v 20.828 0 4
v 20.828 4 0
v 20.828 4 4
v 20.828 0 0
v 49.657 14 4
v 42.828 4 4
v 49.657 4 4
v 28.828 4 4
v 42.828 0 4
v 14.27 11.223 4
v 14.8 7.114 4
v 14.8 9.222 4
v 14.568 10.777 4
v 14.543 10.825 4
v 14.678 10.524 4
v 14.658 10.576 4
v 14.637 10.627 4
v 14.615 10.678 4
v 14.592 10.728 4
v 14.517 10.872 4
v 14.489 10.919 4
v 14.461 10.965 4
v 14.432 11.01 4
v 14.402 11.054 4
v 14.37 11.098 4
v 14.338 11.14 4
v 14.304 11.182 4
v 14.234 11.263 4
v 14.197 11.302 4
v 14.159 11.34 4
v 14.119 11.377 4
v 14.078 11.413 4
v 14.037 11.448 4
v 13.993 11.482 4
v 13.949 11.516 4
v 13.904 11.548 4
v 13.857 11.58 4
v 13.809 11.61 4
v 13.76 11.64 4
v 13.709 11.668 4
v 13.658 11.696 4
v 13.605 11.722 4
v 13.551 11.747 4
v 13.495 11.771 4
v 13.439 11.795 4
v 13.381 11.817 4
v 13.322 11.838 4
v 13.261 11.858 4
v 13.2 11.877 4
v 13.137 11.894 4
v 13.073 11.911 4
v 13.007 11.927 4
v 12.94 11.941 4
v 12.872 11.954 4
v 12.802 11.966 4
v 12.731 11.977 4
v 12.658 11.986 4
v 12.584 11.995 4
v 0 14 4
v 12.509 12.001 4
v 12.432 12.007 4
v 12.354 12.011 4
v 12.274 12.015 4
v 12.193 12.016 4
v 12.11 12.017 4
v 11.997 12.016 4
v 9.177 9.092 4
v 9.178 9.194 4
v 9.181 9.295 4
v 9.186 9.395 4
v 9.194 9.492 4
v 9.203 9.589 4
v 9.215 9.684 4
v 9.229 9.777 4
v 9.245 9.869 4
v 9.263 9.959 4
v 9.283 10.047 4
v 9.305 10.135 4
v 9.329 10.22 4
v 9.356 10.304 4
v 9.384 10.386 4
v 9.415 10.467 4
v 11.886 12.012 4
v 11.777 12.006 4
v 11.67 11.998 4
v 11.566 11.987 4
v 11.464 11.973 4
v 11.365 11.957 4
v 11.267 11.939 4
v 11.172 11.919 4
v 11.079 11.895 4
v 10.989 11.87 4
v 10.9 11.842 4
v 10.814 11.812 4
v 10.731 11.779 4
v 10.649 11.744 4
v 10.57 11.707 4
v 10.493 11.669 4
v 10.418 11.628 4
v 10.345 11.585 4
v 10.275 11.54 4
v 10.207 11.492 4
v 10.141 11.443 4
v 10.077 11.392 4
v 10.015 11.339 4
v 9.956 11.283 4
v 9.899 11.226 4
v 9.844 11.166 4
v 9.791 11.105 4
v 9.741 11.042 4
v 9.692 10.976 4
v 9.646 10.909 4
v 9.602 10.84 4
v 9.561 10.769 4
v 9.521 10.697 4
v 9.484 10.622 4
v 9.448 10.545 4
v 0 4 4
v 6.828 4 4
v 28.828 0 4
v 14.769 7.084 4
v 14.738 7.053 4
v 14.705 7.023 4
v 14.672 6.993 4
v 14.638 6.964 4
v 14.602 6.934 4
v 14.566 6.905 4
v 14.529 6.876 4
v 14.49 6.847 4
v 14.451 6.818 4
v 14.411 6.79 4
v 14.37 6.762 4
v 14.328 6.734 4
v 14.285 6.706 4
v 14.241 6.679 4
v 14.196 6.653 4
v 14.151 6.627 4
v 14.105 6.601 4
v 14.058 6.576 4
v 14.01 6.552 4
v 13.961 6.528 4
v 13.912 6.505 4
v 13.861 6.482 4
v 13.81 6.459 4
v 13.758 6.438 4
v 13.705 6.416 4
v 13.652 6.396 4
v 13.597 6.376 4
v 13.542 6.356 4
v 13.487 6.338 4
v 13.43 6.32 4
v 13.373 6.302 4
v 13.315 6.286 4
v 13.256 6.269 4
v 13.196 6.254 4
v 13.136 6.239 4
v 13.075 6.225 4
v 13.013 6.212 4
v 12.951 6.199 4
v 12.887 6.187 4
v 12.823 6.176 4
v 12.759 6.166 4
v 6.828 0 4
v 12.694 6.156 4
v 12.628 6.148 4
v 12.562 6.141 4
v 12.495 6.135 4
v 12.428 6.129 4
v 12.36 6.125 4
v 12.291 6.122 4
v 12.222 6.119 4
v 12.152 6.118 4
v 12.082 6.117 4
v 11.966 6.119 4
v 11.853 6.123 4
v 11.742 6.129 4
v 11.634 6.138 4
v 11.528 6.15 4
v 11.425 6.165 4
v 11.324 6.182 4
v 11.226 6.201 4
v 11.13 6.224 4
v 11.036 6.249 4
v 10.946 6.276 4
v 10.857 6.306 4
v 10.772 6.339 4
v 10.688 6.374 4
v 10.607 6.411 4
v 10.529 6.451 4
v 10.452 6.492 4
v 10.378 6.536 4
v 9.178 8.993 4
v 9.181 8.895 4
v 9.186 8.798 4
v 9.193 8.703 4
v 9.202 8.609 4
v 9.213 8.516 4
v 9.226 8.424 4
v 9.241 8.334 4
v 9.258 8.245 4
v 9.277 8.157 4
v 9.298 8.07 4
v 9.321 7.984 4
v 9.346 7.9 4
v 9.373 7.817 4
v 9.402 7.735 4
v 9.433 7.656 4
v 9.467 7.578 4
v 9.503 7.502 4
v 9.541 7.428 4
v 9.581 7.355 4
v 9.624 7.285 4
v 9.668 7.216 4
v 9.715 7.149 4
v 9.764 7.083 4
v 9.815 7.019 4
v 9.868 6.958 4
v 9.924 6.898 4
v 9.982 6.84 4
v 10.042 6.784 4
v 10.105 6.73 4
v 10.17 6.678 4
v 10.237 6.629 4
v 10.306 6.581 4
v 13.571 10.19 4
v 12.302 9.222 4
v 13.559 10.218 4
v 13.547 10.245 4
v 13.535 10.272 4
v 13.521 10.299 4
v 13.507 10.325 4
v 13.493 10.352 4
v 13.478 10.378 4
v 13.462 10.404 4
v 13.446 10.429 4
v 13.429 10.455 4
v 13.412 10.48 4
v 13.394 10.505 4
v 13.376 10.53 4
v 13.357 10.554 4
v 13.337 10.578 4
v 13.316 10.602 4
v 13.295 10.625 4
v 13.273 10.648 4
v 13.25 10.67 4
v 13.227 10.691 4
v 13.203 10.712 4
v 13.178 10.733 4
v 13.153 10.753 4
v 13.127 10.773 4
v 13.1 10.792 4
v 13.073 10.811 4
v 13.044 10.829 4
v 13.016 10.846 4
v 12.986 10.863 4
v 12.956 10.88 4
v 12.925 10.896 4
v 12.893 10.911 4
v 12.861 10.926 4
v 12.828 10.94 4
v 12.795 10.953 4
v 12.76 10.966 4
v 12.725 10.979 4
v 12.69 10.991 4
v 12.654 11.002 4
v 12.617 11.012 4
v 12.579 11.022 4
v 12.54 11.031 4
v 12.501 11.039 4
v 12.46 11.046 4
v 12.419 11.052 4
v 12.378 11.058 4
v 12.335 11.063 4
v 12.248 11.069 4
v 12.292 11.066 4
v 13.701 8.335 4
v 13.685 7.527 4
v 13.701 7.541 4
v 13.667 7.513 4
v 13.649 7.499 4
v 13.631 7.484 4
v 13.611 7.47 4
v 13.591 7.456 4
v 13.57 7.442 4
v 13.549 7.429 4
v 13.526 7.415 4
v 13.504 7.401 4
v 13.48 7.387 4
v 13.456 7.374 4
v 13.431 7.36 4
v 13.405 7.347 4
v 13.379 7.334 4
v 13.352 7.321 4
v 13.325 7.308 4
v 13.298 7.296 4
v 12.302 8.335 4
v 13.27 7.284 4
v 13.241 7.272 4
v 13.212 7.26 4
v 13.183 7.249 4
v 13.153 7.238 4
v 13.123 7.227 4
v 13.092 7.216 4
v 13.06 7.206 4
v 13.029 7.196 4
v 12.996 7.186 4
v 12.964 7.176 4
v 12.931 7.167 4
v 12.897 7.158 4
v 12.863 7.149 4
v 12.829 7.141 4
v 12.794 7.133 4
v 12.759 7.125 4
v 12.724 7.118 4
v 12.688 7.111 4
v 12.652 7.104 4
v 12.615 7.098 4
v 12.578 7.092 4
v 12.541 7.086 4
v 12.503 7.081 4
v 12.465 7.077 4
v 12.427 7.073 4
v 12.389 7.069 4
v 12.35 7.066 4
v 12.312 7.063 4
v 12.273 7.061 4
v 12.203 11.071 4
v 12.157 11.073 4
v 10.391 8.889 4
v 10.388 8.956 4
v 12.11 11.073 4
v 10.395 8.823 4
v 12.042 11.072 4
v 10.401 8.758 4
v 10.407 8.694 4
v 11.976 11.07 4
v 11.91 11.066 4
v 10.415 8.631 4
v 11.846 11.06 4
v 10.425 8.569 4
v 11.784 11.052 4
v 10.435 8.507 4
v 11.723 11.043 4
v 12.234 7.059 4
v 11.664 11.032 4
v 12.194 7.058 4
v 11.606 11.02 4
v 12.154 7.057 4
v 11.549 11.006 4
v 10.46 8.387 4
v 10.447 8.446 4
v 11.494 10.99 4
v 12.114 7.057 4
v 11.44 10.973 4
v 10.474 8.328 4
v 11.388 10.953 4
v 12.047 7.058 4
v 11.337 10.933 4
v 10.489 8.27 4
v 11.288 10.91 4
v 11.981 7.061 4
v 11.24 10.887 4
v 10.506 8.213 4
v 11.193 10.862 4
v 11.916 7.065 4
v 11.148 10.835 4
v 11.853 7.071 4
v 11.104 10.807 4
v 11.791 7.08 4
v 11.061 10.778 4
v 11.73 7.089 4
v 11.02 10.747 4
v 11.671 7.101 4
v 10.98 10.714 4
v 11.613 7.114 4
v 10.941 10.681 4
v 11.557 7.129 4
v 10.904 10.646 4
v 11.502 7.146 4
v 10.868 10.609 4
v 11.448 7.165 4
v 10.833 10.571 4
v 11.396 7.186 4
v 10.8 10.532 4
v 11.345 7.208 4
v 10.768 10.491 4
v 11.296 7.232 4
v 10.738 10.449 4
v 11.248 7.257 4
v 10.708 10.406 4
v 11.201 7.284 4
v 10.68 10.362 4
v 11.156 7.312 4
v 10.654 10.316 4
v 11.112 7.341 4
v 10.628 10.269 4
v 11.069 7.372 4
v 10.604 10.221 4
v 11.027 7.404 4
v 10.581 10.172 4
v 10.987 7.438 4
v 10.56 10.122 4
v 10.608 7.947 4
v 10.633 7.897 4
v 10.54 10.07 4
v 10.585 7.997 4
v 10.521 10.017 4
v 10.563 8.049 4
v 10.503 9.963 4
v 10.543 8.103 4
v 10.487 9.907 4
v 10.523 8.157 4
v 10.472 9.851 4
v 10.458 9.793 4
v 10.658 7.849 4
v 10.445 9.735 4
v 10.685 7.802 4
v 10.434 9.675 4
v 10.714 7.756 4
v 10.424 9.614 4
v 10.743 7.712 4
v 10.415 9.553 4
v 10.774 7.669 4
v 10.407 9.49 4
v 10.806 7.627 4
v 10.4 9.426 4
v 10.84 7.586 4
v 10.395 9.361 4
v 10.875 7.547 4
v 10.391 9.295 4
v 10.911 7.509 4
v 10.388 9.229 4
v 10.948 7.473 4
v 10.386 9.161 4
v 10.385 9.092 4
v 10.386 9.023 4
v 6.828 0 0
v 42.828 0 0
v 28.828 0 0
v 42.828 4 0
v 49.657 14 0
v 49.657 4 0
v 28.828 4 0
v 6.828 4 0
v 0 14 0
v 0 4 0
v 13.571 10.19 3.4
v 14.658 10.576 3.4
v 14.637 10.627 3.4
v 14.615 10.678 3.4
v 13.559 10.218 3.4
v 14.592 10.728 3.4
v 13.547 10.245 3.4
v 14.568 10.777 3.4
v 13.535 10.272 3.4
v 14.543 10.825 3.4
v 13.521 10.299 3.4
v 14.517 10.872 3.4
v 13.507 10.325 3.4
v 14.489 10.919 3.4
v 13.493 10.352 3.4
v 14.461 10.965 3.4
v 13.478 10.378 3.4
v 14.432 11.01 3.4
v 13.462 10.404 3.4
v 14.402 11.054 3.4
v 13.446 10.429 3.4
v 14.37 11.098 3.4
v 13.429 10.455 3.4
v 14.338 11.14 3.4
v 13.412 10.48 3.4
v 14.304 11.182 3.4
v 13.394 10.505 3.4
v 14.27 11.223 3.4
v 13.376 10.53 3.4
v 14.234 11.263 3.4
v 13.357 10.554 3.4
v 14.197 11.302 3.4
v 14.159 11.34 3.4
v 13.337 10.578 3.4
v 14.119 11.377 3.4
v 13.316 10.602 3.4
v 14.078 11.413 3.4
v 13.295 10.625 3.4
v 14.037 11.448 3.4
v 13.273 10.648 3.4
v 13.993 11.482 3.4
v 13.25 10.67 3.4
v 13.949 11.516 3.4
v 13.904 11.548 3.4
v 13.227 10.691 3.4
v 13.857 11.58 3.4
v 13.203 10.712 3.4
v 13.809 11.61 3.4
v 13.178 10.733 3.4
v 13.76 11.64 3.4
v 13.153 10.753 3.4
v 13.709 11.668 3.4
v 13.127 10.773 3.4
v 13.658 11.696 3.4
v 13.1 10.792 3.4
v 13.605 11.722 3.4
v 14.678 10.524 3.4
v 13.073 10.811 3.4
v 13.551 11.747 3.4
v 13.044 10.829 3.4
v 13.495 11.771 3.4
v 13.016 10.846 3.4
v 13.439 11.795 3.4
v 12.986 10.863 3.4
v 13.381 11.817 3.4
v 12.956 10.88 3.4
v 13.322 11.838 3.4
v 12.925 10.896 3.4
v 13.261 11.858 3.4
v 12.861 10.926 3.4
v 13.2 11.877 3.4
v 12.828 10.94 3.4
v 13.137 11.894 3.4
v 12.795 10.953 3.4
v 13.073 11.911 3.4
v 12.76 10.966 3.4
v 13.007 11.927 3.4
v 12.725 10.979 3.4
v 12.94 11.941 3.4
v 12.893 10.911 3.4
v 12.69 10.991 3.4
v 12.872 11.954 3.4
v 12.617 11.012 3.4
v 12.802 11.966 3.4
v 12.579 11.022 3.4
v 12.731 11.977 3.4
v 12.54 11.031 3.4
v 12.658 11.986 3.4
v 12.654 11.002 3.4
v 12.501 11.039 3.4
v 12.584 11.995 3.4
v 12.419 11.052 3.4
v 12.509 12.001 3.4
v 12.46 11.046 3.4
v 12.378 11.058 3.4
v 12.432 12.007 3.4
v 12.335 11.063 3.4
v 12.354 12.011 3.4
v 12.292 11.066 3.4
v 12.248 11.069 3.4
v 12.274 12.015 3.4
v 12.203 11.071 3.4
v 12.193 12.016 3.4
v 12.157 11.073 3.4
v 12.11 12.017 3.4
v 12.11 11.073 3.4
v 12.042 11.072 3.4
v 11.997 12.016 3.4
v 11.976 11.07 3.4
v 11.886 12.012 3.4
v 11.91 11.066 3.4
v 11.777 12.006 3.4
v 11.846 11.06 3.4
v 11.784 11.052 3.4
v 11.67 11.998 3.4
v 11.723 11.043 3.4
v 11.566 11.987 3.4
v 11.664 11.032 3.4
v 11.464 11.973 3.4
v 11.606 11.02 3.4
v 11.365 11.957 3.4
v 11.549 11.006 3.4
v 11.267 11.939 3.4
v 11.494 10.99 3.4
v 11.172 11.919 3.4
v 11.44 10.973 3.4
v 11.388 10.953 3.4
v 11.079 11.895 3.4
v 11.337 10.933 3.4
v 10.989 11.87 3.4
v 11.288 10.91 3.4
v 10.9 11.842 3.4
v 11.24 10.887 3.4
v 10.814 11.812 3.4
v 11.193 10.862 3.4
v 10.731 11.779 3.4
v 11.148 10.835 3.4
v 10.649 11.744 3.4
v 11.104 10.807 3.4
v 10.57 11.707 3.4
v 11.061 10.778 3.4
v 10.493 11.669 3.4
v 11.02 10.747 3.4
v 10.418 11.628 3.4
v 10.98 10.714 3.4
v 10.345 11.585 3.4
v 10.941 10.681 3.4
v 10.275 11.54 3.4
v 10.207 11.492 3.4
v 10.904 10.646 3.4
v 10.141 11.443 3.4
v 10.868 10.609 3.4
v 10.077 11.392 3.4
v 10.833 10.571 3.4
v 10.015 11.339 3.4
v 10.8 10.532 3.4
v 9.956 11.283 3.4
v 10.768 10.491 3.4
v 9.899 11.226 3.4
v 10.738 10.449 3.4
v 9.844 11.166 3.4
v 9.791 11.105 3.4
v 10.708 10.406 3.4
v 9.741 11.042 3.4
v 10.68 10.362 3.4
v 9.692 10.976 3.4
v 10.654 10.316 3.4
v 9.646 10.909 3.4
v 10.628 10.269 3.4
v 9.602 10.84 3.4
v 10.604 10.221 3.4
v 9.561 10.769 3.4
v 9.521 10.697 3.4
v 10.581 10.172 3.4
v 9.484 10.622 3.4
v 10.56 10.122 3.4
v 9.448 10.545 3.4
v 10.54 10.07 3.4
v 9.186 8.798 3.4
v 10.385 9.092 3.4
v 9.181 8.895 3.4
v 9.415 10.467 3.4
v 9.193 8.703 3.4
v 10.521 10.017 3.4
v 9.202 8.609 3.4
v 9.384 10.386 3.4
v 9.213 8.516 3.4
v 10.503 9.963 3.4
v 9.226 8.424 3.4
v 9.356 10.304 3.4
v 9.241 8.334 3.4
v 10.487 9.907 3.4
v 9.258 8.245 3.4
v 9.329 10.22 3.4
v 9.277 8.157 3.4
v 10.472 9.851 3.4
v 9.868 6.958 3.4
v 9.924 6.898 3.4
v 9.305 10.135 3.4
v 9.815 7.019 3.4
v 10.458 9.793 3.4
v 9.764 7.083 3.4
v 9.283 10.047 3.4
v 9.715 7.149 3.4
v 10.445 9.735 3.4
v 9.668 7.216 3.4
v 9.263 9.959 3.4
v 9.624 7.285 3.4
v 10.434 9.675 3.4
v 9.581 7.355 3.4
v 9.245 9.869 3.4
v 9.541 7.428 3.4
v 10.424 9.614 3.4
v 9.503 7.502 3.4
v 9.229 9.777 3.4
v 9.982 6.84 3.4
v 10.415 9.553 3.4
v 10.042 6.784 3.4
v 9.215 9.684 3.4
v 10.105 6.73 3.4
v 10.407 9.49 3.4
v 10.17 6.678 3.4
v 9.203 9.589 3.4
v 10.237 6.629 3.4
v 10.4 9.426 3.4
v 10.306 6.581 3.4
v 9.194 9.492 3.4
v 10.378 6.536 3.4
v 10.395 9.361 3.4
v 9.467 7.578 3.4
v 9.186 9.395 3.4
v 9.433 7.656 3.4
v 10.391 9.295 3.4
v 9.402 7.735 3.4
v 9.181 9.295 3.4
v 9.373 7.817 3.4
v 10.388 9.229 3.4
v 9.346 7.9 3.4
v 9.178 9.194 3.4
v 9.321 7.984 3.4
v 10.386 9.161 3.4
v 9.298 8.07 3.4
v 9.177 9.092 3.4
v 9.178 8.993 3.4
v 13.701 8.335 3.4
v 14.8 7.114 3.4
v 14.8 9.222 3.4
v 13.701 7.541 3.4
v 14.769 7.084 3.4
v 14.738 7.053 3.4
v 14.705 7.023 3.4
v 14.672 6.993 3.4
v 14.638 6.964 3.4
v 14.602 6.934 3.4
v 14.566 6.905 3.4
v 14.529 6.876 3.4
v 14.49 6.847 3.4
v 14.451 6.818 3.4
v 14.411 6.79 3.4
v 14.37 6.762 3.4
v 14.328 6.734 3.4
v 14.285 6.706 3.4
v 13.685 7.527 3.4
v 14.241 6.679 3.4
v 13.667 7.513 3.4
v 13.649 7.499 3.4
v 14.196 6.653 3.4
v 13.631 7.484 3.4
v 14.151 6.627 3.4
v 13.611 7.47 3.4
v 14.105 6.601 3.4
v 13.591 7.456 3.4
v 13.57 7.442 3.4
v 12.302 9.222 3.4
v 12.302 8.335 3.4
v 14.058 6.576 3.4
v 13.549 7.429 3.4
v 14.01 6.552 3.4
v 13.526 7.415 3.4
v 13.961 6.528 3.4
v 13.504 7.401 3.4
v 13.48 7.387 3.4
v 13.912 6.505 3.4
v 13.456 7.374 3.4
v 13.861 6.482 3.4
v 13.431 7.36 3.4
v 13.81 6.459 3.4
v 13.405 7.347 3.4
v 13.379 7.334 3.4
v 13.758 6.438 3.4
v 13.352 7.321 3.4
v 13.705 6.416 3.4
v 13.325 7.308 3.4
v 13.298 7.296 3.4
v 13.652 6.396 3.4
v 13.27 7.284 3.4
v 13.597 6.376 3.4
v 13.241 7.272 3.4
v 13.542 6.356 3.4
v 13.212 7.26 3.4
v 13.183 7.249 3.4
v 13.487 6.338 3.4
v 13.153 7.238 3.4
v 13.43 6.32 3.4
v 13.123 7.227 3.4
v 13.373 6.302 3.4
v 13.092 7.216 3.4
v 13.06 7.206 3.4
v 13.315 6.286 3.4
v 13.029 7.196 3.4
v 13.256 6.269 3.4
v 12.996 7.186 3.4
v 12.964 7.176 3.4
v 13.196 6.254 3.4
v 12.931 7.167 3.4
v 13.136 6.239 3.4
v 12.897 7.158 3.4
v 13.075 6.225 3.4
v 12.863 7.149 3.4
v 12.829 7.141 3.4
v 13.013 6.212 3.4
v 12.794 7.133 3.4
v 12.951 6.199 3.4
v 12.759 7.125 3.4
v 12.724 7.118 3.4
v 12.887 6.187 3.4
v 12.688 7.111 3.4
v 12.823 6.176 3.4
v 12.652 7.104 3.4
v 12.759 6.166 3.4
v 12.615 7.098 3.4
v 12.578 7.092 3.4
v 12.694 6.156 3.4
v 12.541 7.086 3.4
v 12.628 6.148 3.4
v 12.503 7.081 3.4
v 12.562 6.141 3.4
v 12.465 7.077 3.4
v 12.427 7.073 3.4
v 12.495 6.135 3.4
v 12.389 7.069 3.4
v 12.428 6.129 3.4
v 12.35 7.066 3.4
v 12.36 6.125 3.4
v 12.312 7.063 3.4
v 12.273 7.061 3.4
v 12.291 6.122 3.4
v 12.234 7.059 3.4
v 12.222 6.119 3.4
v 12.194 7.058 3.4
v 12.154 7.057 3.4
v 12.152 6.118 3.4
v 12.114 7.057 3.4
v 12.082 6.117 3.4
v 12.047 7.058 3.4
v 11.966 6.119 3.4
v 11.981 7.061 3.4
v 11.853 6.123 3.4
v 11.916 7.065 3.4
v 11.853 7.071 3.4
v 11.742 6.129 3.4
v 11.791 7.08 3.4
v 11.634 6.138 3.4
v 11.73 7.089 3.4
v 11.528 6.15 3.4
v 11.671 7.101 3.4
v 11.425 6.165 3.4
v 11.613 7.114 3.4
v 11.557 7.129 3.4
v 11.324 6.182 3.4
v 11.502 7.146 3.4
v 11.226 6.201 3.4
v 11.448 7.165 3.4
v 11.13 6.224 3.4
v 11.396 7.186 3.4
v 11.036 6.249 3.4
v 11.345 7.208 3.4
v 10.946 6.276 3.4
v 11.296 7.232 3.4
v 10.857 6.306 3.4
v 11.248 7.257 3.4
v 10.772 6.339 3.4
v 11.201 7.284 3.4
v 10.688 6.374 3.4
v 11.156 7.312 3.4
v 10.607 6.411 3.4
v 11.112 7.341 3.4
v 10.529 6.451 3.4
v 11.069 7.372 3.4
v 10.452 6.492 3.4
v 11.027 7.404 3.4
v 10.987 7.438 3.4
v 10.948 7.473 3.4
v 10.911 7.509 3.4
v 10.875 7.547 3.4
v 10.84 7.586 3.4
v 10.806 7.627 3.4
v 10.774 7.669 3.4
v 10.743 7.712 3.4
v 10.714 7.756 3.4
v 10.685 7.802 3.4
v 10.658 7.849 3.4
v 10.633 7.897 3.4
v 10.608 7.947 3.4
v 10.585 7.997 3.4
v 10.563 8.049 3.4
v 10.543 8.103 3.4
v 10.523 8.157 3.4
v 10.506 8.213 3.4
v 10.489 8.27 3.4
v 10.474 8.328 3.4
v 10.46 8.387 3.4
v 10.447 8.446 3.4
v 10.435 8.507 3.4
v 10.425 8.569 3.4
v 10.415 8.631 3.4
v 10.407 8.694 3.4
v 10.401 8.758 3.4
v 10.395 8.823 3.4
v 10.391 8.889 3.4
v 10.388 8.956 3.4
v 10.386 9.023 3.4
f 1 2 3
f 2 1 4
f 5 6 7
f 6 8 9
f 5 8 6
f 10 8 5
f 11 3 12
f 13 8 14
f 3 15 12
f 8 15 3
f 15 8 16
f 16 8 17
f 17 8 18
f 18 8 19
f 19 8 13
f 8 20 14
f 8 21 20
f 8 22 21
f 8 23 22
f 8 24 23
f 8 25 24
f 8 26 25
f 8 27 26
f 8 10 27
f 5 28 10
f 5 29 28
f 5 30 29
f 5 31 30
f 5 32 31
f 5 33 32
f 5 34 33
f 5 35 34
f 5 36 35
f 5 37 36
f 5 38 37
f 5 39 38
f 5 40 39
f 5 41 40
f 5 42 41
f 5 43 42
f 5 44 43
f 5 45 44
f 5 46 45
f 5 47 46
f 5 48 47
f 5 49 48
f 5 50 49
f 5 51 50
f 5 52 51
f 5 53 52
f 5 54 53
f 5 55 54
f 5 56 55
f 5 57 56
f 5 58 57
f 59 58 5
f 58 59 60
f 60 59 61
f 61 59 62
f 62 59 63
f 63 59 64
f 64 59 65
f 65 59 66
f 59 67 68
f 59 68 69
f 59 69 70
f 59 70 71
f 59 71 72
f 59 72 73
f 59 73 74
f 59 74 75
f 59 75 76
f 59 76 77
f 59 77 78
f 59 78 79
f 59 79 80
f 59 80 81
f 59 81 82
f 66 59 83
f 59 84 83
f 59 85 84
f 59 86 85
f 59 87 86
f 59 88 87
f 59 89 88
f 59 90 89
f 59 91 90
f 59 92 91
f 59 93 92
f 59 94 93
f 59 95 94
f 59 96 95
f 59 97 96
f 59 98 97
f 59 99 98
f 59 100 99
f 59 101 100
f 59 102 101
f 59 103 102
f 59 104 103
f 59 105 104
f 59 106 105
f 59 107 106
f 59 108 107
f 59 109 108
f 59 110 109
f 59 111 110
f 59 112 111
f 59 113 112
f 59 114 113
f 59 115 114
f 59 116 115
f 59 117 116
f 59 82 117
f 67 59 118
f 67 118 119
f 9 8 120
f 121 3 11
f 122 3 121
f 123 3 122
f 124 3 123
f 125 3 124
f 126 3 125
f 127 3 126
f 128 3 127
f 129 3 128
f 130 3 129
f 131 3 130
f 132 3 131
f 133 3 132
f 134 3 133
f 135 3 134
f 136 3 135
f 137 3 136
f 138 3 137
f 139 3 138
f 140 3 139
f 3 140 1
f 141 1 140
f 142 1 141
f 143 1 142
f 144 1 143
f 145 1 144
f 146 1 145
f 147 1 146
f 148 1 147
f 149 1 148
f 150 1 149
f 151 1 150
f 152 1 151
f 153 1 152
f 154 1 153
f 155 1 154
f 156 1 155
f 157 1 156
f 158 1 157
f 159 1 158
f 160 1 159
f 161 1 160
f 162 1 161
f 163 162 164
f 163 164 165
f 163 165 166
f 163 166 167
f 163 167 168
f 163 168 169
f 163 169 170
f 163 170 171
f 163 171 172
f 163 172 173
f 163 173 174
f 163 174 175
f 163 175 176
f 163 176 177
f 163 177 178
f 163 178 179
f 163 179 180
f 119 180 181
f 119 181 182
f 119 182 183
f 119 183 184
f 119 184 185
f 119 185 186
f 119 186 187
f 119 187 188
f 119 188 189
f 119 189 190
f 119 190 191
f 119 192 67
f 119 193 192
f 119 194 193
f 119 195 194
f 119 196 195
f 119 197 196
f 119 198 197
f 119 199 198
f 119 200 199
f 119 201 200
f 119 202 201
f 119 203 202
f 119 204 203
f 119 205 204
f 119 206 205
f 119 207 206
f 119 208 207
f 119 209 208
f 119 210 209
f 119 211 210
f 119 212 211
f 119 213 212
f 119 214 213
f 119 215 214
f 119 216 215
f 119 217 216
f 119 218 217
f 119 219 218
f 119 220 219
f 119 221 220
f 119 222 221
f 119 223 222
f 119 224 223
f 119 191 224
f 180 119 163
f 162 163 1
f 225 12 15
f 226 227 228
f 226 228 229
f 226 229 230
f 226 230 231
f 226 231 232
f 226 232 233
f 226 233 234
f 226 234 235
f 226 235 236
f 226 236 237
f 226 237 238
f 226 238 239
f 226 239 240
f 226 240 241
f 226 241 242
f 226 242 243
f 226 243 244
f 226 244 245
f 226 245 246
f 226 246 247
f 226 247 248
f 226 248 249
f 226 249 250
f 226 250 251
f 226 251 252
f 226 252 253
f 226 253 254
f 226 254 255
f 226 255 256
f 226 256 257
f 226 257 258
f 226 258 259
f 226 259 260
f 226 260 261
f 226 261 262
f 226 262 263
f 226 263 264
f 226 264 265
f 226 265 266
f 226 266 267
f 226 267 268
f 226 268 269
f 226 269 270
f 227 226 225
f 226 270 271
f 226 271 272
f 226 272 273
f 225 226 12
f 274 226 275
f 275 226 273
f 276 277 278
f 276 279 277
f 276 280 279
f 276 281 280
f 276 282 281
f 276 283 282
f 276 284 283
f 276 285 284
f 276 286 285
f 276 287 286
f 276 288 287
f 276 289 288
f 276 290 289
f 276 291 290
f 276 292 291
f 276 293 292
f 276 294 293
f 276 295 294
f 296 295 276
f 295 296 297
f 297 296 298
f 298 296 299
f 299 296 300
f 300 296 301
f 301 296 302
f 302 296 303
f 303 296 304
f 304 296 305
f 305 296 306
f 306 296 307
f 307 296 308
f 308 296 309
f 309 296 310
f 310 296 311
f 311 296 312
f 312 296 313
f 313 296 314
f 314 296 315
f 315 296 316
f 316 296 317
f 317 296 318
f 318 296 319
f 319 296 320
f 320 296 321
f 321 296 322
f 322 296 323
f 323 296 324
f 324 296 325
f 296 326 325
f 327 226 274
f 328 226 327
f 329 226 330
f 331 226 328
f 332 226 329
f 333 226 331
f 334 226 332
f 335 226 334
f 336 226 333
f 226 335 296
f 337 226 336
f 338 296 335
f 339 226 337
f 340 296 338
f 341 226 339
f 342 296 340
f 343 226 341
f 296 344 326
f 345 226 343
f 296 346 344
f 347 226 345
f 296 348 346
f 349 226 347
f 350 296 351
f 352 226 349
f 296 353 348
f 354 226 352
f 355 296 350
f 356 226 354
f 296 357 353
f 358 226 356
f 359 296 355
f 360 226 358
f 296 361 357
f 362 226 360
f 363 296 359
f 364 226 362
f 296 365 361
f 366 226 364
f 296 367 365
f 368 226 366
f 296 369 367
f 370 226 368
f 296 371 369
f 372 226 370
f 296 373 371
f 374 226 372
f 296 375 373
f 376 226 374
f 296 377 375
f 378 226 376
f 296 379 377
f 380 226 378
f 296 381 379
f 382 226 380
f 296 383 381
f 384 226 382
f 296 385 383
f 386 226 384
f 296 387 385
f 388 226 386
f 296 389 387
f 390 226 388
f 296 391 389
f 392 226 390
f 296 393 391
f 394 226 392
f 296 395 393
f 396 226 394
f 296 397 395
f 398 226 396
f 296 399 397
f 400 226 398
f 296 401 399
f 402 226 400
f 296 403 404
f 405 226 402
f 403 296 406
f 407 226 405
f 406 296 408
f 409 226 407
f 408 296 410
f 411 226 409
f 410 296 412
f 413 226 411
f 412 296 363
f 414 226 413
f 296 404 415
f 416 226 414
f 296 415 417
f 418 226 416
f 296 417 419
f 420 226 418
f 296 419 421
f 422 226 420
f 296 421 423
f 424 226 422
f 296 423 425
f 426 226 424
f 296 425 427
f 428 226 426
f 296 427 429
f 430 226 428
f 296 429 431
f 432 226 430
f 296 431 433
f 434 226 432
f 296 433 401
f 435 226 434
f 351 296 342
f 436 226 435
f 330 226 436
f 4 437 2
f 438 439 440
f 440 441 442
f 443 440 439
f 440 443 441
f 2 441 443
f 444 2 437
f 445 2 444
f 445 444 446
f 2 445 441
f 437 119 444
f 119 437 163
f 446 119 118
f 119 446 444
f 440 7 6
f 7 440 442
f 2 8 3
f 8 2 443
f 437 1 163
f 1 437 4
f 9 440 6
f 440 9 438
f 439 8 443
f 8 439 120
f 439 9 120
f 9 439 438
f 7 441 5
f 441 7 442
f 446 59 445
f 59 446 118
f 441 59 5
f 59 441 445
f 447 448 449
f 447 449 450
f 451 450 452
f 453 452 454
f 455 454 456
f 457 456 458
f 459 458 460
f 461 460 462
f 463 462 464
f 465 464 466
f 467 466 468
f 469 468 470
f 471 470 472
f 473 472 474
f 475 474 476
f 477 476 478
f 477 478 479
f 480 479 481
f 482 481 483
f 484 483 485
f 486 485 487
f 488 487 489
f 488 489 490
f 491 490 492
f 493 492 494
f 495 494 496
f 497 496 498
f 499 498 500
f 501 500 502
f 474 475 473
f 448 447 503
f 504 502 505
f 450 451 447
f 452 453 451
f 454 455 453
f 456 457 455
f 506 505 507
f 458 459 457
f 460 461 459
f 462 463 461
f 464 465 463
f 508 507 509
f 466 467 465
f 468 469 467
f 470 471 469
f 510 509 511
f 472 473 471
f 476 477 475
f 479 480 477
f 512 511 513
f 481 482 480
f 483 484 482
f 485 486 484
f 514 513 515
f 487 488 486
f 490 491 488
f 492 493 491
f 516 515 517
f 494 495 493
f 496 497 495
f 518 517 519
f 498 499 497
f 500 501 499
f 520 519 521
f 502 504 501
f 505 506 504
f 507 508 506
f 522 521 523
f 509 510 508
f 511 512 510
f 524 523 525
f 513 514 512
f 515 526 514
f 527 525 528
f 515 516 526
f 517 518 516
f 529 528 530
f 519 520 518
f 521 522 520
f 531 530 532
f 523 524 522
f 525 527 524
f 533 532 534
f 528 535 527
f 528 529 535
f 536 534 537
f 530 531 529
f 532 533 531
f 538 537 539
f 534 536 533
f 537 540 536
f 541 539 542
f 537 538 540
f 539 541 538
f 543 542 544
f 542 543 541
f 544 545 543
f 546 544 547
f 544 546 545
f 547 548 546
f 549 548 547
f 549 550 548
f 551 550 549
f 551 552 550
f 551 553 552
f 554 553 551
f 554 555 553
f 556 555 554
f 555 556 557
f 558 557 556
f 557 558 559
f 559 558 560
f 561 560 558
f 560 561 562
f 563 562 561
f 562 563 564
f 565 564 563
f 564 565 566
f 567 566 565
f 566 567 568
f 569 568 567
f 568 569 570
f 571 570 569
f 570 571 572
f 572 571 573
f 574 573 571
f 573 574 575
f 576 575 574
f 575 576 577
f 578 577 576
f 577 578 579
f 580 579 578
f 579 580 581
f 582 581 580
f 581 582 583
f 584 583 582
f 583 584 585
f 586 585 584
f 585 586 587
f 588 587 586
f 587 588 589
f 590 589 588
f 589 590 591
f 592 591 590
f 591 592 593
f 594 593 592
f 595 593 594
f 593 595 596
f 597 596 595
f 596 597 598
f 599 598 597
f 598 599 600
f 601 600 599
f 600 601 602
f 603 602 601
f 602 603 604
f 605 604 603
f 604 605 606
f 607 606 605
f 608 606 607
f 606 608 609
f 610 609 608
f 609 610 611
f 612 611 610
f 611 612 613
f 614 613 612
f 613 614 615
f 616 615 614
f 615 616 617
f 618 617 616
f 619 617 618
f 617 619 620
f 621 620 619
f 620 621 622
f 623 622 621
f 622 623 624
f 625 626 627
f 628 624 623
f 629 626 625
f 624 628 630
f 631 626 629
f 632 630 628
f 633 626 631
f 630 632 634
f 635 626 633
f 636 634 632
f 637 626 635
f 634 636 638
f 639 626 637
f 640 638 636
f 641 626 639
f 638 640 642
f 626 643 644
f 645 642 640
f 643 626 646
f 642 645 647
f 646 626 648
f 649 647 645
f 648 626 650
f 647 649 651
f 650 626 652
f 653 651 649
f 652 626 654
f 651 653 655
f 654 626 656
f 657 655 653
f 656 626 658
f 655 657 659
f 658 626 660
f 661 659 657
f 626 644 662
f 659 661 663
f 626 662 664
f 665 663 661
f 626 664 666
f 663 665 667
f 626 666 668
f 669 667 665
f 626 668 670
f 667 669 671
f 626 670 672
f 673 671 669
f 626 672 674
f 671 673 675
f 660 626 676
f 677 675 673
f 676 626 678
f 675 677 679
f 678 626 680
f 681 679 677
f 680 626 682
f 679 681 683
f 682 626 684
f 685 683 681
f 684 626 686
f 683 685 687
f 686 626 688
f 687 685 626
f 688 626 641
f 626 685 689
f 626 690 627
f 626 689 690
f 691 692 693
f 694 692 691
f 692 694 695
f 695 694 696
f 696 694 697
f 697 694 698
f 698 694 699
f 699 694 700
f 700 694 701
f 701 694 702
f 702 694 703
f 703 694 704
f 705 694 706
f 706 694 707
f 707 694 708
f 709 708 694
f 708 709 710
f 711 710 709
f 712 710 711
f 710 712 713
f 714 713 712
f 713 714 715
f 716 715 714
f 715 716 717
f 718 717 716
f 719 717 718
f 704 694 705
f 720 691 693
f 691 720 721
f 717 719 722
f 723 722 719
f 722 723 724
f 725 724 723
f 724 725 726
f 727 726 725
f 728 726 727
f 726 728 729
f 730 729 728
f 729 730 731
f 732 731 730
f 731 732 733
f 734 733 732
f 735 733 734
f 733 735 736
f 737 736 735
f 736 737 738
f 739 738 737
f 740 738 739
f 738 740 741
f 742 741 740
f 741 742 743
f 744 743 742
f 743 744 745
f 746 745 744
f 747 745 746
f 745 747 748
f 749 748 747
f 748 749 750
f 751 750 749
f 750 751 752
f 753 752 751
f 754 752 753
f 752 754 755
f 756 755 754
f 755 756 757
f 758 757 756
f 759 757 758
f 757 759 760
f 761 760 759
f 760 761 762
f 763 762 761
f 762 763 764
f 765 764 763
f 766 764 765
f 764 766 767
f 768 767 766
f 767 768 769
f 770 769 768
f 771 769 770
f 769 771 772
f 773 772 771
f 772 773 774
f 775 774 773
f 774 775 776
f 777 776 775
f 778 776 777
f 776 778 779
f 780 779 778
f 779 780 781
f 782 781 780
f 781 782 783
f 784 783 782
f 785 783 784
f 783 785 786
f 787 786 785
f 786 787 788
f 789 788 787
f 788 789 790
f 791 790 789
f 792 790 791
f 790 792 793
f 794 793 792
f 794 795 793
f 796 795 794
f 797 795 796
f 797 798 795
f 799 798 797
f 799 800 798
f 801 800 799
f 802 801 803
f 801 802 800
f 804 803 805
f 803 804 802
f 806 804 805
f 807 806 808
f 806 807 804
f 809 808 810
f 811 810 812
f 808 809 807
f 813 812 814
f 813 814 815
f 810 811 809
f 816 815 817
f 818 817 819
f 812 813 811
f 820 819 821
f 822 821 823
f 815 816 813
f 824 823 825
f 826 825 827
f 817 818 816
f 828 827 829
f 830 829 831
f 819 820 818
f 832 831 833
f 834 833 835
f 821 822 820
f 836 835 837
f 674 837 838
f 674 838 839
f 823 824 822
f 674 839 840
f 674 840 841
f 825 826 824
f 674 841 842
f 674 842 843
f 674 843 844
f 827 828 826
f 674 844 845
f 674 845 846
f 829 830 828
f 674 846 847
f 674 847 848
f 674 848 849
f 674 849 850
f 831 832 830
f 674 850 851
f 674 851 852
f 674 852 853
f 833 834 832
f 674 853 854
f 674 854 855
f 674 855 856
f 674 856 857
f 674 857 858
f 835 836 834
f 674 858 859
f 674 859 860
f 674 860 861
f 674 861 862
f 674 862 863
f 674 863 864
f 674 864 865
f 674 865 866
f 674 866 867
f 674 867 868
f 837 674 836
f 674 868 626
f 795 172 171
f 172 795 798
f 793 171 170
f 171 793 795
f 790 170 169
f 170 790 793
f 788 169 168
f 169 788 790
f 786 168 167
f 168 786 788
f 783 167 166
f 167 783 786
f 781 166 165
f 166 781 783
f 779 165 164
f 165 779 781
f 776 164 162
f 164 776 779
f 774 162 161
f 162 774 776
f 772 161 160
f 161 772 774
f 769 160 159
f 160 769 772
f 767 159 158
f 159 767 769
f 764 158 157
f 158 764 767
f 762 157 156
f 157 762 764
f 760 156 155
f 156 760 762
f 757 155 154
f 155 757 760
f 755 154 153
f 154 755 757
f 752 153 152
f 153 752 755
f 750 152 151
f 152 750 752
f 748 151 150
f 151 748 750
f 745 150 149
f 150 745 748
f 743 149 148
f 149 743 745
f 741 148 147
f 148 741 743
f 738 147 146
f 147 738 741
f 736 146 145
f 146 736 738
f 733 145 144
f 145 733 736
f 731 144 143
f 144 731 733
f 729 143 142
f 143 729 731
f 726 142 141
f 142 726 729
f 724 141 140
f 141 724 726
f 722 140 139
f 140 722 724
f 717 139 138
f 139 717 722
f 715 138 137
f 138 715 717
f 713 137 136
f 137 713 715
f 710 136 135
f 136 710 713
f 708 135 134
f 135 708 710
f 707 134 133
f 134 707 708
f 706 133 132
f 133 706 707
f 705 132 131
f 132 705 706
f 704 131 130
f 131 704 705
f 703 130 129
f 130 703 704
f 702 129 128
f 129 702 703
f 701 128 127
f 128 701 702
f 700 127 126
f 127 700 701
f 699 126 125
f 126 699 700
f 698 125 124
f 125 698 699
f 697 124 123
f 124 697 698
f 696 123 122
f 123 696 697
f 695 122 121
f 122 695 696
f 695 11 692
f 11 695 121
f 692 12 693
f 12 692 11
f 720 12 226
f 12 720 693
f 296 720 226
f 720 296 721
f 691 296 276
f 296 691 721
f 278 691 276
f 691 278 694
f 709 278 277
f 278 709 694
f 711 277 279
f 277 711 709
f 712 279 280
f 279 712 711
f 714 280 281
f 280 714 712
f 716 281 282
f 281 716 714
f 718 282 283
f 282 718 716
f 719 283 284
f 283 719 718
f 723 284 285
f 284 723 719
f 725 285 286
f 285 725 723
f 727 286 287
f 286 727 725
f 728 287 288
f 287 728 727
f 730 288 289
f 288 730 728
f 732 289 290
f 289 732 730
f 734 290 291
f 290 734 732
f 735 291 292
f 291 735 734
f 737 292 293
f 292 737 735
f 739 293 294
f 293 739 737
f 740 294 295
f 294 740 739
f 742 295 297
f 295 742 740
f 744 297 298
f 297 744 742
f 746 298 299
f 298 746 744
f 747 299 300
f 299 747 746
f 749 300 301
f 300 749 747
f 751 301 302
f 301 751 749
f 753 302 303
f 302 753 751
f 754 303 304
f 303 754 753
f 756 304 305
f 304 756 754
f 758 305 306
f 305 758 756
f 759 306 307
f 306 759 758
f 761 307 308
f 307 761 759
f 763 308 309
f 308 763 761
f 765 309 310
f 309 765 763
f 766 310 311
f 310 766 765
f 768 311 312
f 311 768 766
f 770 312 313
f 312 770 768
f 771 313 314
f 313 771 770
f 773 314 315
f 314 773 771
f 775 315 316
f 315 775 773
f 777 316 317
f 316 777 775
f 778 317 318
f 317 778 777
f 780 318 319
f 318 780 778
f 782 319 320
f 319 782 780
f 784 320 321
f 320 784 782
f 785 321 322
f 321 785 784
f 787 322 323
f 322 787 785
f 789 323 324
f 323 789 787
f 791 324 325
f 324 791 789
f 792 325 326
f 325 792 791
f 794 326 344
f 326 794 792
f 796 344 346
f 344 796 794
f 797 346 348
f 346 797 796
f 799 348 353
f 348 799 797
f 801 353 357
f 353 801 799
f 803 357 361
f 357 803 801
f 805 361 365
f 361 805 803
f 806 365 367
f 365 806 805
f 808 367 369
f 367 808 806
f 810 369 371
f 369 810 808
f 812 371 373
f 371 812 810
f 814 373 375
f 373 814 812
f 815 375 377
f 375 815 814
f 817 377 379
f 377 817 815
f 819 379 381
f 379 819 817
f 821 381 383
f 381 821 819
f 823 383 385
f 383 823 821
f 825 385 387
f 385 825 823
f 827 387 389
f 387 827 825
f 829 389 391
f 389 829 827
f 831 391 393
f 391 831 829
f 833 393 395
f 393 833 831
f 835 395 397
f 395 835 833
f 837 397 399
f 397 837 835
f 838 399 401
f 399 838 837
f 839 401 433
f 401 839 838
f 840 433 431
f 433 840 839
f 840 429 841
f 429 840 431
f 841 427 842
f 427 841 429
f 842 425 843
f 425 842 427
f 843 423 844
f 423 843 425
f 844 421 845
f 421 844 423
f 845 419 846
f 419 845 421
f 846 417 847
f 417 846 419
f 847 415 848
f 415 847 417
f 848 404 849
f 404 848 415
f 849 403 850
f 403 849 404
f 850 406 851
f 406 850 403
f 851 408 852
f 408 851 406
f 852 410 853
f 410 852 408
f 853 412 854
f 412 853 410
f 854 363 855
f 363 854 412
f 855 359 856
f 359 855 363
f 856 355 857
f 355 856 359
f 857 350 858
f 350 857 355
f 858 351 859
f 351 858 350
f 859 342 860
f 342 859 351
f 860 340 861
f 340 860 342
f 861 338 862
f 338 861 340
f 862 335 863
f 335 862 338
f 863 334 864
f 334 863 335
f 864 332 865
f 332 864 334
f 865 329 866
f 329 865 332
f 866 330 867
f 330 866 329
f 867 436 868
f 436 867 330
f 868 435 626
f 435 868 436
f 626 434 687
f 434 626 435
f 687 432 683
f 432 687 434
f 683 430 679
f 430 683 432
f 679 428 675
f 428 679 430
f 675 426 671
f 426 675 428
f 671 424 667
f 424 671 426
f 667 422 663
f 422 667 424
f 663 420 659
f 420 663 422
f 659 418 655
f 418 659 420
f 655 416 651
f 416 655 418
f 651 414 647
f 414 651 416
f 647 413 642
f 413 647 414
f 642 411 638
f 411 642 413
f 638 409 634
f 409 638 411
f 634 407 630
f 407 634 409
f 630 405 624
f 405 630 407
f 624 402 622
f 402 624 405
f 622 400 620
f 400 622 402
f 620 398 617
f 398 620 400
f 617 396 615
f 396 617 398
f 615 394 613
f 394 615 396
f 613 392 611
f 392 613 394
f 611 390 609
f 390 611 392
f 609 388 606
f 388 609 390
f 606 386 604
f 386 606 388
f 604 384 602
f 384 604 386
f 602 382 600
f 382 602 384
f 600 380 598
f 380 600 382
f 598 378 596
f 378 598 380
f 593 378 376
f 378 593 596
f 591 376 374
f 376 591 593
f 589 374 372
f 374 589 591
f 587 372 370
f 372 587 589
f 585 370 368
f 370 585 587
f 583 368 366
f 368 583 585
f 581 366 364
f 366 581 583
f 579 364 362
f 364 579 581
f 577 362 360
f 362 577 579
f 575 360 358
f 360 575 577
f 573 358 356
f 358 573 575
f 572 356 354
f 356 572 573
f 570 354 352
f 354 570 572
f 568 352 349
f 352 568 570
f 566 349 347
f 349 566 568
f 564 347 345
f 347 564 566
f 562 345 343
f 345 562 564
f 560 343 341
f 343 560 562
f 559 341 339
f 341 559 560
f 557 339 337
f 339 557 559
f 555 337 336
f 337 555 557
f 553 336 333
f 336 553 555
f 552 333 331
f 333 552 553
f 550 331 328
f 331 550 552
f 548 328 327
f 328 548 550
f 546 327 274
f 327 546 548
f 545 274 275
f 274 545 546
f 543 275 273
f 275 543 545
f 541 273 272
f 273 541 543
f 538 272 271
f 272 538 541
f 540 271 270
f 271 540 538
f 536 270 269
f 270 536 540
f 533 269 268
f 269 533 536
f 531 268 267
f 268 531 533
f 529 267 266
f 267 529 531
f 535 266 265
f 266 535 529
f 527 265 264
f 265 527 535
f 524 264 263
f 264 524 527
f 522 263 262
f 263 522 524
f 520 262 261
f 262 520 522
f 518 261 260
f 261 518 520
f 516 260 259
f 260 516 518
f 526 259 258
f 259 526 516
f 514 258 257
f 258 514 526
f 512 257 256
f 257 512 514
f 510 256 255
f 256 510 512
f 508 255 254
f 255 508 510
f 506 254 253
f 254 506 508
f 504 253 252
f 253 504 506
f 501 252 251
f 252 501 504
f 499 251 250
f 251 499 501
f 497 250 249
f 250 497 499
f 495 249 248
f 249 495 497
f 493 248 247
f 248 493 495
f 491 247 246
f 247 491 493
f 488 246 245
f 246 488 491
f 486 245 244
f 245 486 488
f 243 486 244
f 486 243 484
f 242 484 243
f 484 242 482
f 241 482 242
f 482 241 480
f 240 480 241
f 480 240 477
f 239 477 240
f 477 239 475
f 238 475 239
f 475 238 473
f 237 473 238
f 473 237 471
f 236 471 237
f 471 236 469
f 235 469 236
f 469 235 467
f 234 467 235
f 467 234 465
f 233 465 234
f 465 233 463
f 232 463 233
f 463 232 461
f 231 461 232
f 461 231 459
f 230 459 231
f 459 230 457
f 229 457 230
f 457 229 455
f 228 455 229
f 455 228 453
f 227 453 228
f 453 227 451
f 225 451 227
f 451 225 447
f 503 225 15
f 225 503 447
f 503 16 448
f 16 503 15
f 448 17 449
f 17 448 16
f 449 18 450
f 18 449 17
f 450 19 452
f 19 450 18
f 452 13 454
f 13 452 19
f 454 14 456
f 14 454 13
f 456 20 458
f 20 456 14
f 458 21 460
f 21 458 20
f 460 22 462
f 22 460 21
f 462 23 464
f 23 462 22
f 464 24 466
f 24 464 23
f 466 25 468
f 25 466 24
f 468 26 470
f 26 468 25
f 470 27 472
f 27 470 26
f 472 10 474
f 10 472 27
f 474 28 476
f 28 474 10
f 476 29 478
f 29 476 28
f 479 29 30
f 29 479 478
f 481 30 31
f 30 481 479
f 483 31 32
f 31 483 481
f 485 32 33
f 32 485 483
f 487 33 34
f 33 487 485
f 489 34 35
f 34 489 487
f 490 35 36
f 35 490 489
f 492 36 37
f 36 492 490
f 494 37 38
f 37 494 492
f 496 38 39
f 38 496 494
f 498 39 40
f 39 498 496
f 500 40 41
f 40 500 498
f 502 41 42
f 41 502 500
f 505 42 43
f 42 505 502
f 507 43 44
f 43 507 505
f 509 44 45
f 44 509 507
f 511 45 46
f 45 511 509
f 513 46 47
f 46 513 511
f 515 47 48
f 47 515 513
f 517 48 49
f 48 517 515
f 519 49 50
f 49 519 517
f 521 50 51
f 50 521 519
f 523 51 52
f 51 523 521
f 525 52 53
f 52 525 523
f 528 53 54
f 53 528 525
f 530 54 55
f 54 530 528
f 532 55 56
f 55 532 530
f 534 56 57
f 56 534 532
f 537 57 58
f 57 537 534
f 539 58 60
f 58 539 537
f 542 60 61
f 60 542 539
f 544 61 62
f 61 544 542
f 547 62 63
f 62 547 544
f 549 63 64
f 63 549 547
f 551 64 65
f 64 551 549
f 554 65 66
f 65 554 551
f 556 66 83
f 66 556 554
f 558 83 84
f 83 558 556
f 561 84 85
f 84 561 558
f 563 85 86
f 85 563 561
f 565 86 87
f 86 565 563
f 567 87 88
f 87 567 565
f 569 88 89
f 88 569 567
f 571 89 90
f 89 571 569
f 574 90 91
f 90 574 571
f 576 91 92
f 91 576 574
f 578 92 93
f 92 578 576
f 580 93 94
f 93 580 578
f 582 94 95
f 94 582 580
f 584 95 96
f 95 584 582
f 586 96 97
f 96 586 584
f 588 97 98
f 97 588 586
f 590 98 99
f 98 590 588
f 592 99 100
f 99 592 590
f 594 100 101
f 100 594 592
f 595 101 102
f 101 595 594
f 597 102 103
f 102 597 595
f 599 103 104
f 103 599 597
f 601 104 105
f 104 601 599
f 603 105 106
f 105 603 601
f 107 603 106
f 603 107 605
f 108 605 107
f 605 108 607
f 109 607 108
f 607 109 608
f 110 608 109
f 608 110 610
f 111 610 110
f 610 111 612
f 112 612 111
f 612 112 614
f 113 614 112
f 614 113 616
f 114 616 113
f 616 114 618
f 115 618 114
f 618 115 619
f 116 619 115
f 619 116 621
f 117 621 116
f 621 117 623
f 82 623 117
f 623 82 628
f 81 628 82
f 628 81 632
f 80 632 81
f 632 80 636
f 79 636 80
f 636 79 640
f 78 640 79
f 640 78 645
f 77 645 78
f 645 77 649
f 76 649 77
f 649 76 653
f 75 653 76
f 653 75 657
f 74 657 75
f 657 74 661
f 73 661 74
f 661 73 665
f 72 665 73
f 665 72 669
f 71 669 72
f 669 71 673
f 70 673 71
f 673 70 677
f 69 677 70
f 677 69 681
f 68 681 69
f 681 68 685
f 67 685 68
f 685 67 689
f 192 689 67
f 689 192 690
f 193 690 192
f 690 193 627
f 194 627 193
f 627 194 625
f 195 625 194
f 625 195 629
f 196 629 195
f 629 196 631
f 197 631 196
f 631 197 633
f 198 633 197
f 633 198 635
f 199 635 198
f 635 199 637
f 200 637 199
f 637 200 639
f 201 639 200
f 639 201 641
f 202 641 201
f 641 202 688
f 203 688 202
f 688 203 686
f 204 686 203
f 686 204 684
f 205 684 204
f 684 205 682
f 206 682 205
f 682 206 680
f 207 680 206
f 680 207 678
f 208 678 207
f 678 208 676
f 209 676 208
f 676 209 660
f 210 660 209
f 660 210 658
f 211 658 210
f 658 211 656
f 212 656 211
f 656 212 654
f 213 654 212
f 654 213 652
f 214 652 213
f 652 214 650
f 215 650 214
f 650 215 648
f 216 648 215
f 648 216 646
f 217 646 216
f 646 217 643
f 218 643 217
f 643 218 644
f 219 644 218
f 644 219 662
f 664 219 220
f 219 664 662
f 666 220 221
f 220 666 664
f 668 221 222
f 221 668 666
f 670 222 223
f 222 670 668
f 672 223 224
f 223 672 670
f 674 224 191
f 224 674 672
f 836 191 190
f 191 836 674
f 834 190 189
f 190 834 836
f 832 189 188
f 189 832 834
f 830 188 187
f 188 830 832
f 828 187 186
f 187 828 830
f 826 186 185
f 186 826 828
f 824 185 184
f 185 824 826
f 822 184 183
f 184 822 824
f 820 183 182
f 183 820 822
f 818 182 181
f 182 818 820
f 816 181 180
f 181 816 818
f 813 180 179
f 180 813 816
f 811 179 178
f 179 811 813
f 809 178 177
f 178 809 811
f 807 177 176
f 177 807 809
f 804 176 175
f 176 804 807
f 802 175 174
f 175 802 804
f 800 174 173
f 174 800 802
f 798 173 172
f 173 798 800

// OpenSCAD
use <../../../tec_cold_block_mockup.scad>

support_driver_shelf_export();
